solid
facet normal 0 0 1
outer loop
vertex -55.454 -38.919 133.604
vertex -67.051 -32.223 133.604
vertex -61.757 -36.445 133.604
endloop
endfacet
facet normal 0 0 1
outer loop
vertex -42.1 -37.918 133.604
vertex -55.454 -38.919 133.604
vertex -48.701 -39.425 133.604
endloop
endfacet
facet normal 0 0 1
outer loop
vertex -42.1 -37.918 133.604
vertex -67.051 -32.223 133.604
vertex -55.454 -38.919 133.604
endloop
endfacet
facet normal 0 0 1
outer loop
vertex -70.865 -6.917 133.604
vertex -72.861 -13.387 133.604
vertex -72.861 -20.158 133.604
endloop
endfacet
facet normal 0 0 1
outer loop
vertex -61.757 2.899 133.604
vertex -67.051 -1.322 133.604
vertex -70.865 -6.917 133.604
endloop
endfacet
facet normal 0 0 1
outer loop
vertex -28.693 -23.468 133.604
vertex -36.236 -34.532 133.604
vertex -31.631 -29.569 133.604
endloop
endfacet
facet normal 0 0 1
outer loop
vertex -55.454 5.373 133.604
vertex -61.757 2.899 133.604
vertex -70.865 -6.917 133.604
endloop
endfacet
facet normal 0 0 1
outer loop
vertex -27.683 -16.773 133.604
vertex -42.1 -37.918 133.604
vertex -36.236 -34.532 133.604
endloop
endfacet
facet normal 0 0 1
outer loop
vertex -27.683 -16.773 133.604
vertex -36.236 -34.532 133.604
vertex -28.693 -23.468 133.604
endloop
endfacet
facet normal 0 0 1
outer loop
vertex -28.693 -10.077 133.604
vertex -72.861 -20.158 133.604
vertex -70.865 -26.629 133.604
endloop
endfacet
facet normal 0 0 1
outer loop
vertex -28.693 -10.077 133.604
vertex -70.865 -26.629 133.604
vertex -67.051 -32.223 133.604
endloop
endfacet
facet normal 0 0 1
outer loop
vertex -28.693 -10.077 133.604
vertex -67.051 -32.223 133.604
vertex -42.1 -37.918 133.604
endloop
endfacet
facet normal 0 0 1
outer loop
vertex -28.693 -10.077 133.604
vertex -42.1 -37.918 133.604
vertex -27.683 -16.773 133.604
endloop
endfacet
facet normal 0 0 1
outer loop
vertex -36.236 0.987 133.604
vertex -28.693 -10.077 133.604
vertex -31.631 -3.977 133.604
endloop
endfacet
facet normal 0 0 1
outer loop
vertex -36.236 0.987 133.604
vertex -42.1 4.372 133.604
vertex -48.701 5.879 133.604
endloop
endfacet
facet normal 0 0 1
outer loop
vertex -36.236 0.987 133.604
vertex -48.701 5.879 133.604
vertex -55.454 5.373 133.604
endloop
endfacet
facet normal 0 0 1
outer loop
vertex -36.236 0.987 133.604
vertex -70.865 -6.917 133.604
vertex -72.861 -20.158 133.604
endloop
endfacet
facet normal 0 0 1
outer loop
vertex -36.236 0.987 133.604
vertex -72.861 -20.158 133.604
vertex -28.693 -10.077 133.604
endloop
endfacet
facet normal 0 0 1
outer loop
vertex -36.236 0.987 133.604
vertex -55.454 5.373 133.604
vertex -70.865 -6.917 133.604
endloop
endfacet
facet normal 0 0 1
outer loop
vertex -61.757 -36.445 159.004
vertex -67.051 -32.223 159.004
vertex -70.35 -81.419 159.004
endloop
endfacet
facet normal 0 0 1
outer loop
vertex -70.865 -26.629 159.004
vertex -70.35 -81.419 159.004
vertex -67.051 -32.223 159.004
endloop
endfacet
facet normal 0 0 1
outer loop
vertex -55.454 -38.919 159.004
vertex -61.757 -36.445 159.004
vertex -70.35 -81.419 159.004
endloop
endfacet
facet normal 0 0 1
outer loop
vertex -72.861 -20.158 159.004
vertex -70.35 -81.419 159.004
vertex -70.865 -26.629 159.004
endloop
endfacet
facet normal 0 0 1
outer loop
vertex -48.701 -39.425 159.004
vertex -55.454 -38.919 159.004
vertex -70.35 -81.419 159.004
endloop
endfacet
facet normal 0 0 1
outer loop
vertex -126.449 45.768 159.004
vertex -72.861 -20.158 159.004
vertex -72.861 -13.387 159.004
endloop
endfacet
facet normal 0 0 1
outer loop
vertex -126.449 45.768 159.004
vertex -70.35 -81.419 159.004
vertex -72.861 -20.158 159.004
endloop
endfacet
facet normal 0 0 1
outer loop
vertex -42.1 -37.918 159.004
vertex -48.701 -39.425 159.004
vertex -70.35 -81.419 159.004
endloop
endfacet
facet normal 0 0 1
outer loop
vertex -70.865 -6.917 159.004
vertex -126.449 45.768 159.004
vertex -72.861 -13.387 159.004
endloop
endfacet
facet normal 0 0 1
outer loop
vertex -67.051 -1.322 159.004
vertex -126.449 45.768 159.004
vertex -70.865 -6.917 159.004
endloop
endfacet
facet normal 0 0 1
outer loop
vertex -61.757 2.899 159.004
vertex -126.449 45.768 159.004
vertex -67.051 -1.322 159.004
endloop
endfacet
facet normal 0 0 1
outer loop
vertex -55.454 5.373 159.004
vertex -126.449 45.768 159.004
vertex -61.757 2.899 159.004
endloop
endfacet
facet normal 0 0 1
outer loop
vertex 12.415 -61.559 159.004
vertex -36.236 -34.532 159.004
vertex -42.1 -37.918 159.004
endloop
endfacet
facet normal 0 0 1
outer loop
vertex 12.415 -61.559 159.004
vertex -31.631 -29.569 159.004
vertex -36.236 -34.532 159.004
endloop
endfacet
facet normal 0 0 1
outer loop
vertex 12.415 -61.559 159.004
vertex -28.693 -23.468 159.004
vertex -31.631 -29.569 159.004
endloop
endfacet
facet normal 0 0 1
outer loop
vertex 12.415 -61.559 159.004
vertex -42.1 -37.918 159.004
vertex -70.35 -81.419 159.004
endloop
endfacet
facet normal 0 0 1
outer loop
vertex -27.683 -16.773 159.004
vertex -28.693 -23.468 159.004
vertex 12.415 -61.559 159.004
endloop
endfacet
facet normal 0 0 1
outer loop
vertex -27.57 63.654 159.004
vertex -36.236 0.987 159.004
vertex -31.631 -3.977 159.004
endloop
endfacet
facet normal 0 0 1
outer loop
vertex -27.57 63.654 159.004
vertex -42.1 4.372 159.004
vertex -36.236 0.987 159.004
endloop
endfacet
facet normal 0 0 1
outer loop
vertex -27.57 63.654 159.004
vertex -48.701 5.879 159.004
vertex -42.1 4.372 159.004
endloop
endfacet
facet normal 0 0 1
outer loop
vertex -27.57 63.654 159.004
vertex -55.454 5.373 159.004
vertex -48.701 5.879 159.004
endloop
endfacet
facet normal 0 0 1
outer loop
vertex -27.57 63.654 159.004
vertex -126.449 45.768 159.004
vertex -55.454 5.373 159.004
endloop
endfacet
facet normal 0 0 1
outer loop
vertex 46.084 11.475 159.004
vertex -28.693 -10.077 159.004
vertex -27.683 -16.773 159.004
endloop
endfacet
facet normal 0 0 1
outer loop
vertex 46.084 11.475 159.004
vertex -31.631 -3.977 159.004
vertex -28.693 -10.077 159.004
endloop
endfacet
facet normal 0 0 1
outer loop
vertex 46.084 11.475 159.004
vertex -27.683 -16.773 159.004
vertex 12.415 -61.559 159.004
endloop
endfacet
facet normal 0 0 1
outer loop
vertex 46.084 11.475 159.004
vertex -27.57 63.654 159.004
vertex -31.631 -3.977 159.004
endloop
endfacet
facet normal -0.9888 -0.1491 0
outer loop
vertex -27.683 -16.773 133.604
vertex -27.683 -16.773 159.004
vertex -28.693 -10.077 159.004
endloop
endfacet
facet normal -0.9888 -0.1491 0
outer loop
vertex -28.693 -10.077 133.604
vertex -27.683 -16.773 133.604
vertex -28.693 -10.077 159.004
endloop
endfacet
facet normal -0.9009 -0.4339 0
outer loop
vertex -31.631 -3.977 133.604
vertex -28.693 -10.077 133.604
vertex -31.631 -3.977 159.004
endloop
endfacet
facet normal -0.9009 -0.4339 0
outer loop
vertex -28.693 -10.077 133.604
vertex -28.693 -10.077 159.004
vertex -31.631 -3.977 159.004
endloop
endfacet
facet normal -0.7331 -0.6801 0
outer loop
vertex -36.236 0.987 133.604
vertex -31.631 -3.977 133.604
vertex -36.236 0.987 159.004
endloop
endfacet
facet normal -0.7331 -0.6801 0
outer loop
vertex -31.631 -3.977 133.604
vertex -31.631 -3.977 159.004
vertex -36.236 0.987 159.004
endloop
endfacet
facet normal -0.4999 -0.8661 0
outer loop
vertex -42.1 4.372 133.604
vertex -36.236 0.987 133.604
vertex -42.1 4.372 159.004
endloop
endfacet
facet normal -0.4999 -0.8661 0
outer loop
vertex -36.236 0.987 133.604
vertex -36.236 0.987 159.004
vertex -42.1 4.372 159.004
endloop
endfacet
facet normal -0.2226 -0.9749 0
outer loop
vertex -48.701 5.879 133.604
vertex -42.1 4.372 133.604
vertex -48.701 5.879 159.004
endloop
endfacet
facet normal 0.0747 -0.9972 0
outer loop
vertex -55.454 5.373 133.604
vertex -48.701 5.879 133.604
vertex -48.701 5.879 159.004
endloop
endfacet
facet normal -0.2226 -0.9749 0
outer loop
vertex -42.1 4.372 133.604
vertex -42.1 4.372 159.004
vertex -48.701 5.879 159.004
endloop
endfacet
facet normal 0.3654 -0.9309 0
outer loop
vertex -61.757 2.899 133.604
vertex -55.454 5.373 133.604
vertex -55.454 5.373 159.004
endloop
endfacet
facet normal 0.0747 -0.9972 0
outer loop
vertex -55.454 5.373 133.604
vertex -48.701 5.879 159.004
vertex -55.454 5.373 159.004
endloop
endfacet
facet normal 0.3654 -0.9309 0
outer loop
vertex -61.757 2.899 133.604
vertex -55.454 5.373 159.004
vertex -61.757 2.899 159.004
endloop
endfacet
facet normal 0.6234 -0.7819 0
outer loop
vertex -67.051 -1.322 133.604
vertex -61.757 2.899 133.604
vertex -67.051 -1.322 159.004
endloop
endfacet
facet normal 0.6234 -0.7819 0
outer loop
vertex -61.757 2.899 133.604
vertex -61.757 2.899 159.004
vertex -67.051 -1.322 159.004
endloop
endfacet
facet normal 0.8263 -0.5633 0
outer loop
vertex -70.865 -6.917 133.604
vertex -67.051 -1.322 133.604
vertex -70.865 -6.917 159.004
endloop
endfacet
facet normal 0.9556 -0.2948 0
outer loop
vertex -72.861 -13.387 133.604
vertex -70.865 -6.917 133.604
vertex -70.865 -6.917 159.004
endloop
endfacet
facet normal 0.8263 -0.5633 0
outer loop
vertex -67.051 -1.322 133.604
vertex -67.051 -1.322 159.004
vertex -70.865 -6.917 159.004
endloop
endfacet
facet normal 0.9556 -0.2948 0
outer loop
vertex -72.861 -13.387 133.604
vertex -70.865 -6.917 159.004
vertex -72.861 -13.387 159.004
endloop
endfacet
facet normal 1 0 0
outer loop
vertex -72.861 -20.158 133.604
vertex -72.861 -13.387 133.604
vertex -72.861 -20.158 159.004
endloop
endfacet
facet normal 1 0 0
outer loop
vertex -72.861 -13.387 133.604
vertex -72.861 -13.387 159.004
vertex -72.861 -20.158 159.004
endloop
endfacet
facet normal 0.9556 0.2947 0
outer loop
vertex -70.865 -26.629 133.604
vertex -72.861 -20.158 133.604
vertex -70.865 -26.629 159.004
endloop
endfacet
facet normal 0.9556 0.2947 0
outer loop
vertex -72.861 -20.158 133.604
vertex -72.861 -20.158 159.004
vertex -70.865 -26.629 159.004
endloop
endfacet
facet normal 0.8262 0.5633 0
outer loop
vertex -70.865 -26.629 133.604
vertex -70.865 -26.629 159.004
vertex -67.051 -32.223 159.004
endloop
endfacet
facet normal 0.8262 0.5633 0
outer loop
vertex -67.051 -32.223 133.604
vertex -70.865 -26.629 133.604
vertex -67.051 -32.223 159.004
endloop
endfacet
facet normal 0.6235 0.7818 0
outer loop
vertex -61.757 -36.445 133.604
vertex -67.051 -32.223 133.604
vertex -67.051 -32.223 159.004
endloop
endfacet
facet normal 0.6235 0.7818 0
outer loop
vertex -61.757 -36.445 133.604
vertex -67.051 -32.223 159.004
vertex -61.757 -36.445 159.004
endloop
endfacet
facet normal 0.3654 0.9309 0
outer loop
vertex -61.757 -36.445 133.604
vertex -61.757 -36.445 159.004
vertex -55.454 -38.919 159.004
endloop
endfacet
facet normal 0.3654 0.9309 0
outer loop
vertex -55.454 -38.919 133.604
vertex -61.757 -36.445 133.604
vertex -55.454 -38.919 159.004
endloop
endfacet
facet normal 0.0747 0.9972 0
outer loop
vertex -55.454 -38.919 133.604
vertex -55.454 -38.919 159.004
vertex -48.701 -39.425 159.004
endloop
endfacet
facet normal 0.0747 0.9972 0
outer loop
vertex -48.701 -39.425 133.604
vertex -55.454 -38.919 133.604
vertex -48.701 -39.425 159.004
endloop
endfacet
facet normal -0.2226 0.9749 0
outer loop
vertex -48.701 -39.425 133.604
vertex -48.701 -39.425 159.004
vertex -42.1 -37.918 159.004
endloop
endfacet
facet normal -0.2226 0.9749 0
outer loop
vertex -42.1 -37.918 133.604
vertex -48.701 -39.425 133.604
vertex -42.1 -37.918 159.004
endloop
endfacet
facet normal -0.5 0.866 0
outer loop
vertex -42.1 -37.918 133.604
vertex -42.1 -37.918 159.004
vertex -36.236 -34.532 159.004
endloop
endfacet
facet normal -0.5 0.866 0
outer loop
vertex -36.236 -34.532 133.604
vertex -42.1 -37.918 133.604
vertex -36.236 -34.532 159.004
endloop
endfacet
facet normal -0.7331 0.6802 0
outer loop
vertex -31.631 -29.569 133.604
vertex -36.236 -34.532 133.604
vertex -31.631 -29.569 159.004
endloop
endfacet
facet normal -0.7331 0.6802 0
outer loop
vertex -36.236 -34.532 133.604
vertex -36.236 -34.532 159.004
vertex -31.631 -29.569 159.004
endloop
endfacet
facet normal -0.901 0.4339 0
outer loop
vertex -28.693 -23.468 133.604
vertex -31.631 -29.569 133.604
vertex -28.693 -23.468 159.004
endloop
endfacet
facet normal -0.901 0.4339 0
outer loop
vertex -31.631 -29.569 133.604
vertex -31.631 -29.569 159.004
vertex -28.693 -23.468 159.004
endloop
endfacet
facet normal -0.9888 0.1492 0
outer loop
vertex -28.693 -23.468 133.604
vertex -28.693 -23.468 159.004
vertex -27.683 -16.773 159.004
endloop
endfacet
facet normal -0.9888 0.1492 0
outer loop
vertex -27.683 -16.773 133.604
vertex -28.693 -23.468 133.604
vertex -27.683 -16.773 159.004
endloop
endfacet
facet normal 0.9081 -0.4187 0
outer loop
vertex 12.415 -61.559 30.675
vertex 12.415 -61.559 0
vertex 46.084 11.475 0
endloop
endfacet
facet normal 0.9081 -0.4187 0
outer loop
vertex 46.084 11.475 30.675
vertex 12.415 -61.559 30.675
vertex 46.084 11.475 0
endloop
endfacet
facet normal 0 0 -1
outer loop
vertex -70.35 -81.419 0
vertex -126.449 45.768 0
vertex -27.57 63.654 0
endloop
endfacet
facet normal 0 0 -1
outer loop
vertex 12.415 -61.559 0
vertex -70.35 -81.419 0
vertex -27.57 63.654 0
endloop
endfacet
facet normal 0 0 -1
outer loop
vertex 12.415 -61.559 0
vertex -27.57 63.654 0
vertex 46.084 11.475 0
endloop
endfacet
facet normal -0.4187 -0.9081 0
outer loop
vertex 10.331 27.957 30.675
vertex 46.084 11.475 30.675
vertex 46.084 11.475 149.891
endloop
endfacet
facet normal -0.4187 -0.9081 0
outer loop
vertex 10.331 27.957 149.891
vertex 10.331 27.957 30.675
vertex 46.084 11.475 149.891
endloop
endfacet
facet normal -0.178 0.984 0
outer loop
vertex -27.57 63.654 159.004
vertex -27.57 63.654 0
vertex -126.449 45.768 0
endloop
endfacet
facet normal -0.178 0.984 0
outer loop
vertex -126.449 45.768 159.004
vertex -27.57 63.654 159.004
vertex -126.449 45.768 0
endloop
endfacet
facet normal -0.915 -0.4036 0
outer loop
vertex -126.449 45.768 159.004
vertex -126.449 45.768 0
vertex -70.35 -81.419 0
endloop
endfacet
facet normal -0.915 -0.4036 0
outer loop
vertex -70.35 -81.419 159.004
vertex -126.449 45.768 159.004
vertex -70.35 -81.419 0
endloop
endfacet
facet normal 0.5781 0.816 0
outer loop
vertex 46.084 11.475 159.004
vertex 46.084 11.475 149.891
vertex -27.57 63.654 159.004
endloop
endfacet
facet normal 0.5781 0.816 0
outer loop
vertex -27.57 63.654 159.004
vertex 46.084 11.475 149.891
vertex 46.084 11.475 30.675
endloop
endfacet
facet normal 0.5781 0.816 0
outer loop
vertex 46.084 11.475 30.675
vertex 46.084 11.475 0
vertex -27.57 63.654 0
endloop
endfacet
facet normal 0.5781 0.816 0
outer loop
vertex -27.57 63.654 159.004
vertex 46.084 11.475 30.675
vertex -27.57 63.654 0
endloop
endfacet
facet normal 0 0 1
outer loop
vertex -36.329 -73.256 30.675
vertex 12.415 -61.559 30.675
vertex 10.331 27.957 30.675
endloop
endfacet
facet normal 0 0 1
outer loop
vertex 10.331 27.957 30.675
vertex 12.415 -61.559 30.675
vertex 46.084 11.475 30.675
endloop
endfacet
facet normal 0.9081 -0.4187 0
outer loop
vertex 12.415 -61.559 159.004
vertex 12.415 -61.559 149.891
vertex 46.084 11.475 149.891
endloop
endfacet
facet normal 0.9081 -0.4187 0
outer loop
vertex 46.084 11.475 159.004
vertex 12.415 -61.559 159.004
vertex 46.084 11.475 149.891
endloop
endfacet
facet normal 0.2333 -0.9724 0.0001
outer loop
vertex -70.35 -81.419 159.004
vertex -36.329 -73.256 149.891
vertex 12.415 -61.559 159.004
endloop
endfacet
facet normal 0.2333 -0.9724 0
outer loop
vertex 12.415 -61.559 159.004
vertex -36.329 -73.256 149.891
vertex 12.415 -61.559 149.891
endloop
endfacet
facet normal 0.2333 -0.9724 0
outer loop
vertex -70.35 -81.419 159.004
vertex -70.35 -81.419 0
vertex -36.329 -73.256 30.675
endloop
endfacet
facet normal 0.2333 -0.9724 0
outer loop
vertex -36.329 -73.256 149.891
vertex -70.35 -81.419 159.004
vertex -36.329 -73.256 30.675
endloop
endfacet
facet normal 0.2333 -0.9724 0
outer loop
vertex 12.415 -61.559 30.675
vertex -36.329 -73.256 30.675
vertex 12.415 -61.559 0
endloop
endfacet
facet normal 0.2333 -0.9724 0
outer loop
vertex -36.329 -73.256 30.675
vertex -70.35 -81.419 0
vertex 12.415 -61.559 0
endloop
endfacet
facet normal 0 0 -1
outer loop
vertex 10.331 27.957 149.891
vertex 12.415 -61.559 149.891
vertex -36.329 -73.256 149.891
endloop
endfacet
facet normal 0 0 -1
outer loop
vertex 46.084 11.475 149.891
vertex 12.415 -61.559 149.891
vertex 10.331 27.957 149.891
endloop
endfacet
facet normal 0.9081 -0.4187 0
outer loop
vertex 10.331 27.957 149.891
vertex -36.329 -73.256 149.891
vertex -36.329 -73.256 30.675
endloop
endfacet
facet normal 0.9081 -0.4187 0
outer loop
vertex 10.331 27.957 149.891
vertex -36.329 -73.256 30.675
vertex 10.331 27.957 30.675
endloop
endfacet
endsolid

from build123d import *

# Parameters (mm, degrees)
F1_DEPTH = 159.004
F2_R     = 22.7154462009
F3_DEPTH = 25.4
F4_W     = 112.0414791829
F4_H     = 119.2157939076
F5_DEPTH = 39.37


with BuildPart() as f1:
    # F0 (on Top) → F1 (new body)
    with BuildSketch(Plane.XY):
        Polygon((-126.4487951994, 45.7677543163), (-70.34984231, -81.4194008708), (12.415018864, -61.5593157709), (46.0842102766, 11.474811472), (-27.5696720928, 63.6536478996), align=None)
    extrude(amount=F1_DEPTH)

    # F2 (on face) → F3 (cut)
    with BuildSketch(Plane.XY.offset(159.004)):
        with Locations((-50.3989383578, -16.7727395892)):
            Circle(F2_R)
    extrude(amount=-F3_DEPTH, mode=Mode.SUBTRACT)

    # F4 (on face) → F5 (cut)
    with BuildSketch(Plane(origin=(33.64399896, -15.5100948506, 0), x_dir=(0.4186597128, 0.9081431852, 0), z_dir=(0.9081431852, -0.4186597128, 0))):
        with Locations((-26.3063655135, 90.2826599777)):
            Rectangle(F4_W, F4_H)
    extrude(amount=-F5_DEPTH, mode=Mode.SUBTRACT)


solid = f1.part
